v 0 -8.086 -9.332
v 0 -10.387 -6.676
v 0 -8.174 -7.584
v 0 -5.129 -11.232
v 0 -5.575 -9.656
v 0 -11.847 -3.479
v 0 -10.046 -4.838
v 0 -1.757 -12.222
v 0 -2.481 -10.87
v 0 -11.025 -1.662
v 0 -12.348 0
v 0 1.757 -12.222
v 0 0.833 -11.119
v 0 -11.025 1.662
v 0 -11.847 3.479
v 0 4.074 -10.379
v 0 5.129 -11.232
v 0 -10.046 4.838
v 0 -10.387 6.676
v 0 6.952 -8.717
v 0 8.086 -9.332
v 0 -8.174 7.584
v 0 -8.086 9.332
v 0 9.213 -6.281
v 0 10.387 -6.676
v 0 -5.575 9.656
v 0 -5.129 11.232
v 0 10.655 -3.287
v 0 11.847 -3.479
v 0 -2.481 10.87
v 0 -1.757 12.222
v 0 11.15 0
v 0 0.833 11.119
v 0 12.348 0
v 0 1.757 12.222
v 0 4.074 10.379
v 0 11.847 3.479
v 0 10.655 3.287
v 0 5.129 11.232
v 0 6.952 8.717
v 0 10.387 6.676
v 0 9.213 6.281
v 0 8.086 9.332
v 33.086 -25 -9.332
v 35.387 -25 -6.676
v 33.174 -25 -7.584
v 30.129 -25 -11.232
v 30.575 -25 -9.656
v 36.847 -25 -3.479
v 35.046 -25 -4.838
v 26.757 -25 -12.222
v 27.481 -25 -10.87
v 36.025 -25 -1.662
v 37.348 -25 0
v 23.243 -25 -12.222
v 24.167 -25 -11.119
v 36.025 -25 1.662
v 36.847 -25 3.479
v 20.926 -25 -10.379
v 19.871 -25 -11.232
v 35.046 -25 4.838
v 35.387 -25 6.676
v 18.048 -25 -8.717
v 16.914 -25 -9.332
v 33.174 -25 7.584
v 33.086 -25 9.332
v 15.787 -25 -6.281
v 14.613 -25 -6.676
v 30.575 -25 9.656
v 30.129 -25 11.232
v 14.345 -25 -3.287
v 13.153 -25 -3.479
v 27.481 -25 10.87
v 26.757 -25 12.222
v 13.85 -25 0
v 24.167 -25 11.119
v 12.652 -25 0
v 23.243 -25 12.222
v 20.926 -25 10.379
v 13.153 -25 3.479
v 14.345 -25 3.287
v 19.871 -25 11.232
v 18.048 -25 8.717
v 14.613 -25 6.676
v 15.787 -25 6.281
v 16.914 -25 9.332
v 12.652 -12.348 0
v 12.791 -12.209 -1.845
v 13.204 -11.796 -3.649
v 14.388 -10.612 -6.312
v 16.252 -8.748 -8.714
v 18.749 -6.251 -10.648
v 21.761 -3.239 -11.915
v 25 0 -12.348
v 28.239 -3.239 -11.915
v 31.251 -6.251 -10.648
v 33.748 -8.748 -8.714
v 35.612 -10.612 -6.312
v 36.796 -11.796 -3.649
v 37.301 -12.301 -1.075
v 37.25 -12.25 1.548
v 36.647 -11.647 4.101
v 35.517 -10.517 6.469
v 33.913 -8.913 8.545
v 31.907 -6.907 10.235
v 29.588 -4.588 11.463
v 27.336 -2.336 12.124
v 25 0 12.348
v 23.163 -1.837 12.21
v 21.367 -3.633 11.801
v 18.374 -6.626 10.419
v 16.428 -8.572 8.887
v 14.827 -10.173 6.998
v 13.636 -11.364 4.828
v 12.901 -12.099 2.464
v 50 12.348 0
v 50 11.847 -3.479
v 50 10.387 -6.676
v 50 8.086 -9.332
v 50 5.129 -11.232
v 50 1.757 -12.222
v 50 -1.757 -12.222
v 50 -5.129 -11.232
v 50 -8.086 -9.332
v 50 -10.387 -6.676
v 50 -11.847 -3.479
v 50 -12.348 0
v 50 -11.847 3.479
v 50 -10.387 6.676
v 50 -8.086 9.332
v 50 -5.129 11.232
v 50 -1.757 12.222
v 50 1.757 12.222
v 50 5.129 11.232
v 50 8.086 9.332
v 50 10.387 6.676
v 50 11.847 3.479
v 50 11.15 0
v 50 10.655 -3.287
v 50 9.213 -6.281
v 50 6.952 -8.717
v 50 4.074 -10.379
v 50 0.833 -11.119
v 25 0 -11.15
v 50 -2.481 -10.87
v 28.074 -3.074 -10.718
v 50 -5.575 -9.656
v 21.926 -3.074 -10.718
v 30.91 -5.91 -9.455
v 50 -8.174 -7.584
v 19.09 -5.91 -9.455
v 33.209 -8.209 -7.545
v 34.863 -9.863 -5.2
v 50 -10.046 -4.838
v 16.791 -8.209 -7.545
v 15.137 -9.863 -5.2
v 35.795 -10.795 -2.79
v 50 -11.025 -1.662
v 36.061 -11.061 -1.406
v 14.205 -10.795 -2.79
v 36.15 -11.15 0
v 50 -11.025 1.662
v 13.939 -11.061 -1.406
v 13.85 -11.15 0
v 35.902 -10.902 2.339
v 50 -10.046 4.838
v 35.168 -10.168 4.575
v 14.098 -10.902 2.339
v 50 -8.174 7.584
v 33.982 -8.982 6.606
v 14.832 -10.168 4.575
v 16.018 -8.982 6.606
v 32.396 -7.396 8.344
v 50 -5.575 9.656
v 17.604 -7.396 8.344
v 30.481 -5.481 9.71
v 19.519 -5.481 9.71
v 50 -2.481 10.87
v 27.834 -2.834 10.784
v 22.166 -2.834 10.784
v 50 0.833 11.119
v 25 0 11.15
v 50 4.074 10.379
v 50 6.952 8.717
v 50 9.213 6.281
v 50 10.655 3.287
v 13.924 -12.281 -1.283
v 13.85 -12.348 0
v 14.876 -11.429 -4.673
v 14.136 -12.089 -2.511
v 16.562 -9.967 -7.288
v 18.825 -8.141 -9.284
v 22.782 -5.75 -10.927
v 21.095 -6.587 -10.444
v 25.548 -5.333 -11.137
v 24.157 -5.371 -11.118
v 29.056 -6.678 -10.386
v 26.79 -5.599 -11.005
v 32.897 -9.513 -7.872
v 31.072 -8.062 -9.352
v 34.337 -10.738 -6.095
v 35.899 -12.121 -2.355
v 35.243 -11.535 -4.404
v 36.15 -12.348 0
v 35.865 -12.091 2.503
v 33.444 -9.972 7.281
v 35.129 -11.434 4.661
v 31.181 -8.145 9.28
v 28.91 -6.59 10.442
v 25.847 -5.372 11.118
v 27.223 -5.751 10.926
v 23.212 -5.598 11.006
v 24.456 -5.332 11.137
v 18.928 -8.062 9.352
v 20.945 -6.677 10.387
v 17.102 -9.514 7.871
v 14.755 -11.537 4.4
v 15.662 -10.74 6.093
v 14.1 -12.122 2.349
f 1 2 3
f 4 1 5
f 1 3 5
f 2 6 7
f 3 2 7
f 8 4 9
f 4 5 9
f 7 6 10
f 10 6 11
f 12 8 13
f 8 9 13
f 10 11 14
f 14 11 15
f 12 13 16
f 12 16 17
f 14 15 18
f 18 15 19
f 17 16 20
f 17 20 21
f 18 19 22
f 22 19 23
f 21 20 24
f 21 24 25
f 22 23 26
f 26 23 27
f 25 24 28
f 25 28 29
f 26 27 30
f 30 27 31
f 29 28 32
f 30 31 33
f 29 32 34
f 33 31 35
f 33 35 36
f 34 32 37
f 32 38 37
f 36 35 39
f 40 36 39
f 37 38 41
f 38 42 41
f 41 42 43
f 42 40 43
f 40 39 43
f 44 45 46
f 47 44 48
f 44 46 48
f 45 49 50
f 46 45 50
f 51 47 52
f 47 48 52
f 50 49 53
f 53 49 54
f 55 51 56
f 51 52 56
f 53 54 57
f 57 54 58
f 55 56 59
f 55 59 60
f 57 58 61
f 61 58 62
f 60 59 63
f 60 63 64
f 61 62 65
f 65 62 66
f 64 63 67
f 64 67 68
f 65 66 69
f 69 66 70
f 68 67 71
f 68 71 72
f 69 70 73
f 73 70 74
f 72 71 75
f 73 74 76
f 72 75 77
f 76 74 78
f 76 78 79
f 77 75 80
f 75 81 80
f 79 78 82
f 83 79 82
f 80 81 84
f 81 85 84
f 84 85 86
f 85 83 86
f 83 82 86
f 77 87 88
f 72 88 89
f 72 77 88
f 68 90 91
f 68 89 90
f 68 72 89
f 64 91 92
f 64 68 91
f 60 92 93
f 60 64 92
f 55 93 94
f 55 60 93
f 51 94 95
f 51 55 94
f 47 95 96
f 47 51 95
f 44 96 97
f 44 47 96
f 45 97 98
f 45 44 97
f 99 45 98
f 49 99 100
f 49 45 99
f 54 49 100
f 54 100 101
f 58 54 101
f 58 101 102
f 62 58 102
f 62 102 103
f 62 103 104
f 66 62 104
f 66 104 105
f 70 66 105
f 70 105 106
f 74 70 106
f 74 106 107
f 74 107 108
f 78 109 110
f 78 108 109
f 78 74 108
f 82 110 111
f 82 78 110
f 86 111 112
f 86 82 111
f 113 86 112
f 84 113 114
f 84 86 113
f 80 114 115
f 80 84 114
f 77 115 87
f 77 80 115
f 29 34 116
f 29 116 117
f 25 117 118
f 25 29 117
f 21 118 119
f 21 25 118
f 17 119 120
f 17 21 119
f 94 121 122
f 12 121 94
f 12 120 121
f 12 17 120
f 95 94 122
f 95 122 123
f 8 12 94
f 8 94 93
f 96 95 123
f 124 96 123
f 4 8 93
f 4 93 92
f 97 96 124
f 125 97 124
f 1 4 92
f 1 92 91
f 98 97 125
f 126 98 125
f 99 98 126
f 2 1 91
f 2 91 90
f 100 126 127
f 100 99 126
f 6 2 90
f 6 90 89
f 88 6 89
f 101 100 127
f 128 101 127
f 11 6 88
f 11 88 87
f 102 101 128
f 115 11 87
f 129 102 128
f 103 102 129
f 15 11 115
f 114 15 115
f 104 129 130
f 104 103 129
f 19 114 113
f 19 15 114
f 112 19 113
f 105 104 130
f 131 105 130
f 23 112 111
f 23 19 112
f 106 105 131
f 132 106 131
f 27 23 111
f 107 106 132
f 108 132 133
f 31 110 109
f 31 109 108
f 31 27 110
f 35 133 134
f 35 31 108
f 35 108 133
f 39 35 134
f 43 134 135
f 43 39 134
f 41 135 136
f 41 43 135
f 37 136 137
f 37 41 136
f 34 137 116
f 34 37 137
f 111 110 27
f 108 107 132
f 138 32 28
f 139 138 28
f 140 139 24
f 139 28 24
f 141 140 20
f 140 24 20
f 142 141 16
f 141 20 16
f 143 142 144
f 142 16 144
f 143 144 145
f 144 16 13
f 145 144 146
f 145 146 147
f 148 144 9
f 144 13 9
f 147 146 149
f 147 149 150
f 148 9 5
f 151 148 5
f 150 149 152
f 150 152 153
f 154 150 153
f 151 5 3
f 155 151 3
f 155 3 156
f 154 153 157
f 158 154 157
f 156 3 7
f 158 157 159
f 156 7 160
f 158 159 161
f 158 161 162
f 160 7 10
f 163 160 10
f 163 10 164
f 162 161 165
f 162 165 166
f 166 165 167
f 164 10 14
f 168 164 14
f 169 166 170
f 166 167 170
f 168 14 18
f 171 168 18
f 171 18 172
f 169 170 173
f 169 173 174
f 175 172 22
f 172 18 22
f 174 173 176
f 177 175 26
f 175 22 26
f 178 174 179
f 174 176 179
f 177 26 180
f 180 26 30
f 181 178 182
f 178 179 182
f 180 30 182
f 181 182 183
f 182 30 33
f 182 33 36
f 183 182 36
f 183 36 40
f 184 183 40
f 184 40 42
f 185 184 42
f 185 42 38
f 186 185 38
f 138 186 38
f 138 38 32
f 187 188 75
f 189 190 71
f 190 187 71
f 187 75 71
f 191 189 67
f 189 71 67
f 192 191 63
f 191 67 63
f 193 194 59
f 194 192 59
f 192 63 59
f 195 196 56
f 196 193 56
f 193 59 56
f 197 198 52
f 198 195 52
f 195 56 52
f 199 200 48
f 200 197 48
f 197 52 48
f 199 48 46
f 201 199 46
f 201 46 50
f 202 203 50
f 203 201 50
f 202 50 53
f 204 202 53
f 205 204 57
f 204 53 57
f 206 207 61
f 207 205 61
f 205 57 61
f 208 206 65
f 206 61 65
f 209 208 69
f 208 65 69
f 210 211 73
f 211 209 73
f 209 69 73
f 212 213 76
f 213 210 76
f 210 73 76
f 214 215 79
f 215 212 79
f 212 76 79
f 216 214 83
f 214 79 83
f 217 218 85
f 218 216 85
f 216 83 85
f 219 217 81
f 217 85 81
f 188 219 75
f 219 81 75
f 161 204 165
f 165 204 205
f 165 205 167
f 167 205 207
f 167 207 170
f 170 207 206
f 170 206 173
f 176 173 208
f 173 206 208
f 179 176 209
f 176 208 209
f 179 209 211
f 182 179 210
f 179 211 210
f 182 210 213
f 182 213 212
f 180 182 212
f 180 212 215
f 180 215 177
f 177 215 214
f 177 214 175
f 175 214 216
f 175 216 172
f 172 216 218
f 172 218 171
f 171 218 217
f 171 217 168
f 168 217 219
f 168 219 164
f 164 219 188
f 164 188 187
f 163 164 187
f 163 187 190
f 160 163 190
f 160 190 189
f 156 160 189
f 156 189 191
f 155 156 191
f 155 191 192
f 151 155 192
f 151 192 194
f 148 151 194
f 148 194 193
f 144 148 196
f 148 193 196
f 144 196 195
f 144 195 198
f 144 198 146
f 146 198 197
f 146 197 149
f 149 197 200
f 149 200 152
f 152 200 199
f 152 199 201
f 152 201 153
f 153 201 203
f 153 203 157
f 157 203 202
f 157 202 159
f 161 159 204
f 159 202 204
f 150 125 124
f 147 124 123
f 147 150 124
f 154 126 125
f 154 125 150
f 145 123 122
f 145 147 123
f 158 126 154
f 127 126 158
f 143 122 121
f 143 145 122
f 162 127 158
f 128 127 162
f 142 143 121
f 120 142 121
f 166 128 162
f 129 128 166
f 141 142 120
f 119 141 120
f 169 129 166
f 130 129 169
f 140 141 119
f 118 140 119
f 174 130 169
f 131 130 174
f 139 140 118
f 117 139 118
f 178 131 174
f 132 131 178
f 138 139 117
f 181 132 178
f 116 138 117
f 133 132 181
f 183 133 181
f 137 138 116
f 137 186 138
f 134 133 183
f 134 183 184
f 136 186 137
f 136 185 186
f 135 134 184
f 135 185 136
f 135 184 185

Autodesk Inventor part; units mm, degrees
ref_plane "YZ Plane" through (0, 0, 0) normal (1, 0, 0) x (0, 1, 0)
ref_plane "XY Plane" through (0, 0, 0) normal (0, 0, 1) x (1, 0, 0)
sketch "Sketch1" plane through (0, 0, 0) normal (1, 0, 0) x (0, 1, 0)
  circle A0 centre (0, 0) radius 11.15
  circle A1 centre (0, 0) radius 12.3475
  dimension "d0" = 22.3
  dimension "d1" = 24.695
extrude "Extrusion1" add sketch "Sketch1" along normal blind 50
ref_plane "Work Plane2" through (0, -25, 0) normal (0, 1, 0) x (-1, 0, 0)
sketch "Sketch2" plane through (0, -25, 0) normal (0, 1, 0) x (-1, 0, 0)
  line L0 (0, 0) -> (-50, 0)
  line L1 (-50, 12.3475) -> (-50, -12.3475) projected
  circle A0 centre (-25, 0) radius 12.3475
  circle A1 centre (-25, 0) radius 11.15
  dimension "d6" = 50
  dimension "d7" = 22.3
extrude "Extrusion2" add sketch "Sketch2" along normal blind 25 contours A0 L0 A1 | L0 A1 A0
sketch "Sketch3" plane through (0, 0, 0) normal (-1, 0, 0) x (0, 0, 1)
  line L0 (11.15, 0) -> (-11.15, 0) projected
  circle A0 centre (0, 0) radius 11.15
extrude "Extrusion3" cut sketch "Sketch3" against normal blind 78.975
sketch "Sketch4" plane through (25, -25, 0) normal (0, -1, 0) x (1, 0, 0)
  circle A0 centre (0, 0) radius 11.15
  point P0 (-25, 0)
extrude "Extrusion4" cut sketch "Sketch4" against normal blind 25
properties part number "Connector" material "PVC-Piping"
